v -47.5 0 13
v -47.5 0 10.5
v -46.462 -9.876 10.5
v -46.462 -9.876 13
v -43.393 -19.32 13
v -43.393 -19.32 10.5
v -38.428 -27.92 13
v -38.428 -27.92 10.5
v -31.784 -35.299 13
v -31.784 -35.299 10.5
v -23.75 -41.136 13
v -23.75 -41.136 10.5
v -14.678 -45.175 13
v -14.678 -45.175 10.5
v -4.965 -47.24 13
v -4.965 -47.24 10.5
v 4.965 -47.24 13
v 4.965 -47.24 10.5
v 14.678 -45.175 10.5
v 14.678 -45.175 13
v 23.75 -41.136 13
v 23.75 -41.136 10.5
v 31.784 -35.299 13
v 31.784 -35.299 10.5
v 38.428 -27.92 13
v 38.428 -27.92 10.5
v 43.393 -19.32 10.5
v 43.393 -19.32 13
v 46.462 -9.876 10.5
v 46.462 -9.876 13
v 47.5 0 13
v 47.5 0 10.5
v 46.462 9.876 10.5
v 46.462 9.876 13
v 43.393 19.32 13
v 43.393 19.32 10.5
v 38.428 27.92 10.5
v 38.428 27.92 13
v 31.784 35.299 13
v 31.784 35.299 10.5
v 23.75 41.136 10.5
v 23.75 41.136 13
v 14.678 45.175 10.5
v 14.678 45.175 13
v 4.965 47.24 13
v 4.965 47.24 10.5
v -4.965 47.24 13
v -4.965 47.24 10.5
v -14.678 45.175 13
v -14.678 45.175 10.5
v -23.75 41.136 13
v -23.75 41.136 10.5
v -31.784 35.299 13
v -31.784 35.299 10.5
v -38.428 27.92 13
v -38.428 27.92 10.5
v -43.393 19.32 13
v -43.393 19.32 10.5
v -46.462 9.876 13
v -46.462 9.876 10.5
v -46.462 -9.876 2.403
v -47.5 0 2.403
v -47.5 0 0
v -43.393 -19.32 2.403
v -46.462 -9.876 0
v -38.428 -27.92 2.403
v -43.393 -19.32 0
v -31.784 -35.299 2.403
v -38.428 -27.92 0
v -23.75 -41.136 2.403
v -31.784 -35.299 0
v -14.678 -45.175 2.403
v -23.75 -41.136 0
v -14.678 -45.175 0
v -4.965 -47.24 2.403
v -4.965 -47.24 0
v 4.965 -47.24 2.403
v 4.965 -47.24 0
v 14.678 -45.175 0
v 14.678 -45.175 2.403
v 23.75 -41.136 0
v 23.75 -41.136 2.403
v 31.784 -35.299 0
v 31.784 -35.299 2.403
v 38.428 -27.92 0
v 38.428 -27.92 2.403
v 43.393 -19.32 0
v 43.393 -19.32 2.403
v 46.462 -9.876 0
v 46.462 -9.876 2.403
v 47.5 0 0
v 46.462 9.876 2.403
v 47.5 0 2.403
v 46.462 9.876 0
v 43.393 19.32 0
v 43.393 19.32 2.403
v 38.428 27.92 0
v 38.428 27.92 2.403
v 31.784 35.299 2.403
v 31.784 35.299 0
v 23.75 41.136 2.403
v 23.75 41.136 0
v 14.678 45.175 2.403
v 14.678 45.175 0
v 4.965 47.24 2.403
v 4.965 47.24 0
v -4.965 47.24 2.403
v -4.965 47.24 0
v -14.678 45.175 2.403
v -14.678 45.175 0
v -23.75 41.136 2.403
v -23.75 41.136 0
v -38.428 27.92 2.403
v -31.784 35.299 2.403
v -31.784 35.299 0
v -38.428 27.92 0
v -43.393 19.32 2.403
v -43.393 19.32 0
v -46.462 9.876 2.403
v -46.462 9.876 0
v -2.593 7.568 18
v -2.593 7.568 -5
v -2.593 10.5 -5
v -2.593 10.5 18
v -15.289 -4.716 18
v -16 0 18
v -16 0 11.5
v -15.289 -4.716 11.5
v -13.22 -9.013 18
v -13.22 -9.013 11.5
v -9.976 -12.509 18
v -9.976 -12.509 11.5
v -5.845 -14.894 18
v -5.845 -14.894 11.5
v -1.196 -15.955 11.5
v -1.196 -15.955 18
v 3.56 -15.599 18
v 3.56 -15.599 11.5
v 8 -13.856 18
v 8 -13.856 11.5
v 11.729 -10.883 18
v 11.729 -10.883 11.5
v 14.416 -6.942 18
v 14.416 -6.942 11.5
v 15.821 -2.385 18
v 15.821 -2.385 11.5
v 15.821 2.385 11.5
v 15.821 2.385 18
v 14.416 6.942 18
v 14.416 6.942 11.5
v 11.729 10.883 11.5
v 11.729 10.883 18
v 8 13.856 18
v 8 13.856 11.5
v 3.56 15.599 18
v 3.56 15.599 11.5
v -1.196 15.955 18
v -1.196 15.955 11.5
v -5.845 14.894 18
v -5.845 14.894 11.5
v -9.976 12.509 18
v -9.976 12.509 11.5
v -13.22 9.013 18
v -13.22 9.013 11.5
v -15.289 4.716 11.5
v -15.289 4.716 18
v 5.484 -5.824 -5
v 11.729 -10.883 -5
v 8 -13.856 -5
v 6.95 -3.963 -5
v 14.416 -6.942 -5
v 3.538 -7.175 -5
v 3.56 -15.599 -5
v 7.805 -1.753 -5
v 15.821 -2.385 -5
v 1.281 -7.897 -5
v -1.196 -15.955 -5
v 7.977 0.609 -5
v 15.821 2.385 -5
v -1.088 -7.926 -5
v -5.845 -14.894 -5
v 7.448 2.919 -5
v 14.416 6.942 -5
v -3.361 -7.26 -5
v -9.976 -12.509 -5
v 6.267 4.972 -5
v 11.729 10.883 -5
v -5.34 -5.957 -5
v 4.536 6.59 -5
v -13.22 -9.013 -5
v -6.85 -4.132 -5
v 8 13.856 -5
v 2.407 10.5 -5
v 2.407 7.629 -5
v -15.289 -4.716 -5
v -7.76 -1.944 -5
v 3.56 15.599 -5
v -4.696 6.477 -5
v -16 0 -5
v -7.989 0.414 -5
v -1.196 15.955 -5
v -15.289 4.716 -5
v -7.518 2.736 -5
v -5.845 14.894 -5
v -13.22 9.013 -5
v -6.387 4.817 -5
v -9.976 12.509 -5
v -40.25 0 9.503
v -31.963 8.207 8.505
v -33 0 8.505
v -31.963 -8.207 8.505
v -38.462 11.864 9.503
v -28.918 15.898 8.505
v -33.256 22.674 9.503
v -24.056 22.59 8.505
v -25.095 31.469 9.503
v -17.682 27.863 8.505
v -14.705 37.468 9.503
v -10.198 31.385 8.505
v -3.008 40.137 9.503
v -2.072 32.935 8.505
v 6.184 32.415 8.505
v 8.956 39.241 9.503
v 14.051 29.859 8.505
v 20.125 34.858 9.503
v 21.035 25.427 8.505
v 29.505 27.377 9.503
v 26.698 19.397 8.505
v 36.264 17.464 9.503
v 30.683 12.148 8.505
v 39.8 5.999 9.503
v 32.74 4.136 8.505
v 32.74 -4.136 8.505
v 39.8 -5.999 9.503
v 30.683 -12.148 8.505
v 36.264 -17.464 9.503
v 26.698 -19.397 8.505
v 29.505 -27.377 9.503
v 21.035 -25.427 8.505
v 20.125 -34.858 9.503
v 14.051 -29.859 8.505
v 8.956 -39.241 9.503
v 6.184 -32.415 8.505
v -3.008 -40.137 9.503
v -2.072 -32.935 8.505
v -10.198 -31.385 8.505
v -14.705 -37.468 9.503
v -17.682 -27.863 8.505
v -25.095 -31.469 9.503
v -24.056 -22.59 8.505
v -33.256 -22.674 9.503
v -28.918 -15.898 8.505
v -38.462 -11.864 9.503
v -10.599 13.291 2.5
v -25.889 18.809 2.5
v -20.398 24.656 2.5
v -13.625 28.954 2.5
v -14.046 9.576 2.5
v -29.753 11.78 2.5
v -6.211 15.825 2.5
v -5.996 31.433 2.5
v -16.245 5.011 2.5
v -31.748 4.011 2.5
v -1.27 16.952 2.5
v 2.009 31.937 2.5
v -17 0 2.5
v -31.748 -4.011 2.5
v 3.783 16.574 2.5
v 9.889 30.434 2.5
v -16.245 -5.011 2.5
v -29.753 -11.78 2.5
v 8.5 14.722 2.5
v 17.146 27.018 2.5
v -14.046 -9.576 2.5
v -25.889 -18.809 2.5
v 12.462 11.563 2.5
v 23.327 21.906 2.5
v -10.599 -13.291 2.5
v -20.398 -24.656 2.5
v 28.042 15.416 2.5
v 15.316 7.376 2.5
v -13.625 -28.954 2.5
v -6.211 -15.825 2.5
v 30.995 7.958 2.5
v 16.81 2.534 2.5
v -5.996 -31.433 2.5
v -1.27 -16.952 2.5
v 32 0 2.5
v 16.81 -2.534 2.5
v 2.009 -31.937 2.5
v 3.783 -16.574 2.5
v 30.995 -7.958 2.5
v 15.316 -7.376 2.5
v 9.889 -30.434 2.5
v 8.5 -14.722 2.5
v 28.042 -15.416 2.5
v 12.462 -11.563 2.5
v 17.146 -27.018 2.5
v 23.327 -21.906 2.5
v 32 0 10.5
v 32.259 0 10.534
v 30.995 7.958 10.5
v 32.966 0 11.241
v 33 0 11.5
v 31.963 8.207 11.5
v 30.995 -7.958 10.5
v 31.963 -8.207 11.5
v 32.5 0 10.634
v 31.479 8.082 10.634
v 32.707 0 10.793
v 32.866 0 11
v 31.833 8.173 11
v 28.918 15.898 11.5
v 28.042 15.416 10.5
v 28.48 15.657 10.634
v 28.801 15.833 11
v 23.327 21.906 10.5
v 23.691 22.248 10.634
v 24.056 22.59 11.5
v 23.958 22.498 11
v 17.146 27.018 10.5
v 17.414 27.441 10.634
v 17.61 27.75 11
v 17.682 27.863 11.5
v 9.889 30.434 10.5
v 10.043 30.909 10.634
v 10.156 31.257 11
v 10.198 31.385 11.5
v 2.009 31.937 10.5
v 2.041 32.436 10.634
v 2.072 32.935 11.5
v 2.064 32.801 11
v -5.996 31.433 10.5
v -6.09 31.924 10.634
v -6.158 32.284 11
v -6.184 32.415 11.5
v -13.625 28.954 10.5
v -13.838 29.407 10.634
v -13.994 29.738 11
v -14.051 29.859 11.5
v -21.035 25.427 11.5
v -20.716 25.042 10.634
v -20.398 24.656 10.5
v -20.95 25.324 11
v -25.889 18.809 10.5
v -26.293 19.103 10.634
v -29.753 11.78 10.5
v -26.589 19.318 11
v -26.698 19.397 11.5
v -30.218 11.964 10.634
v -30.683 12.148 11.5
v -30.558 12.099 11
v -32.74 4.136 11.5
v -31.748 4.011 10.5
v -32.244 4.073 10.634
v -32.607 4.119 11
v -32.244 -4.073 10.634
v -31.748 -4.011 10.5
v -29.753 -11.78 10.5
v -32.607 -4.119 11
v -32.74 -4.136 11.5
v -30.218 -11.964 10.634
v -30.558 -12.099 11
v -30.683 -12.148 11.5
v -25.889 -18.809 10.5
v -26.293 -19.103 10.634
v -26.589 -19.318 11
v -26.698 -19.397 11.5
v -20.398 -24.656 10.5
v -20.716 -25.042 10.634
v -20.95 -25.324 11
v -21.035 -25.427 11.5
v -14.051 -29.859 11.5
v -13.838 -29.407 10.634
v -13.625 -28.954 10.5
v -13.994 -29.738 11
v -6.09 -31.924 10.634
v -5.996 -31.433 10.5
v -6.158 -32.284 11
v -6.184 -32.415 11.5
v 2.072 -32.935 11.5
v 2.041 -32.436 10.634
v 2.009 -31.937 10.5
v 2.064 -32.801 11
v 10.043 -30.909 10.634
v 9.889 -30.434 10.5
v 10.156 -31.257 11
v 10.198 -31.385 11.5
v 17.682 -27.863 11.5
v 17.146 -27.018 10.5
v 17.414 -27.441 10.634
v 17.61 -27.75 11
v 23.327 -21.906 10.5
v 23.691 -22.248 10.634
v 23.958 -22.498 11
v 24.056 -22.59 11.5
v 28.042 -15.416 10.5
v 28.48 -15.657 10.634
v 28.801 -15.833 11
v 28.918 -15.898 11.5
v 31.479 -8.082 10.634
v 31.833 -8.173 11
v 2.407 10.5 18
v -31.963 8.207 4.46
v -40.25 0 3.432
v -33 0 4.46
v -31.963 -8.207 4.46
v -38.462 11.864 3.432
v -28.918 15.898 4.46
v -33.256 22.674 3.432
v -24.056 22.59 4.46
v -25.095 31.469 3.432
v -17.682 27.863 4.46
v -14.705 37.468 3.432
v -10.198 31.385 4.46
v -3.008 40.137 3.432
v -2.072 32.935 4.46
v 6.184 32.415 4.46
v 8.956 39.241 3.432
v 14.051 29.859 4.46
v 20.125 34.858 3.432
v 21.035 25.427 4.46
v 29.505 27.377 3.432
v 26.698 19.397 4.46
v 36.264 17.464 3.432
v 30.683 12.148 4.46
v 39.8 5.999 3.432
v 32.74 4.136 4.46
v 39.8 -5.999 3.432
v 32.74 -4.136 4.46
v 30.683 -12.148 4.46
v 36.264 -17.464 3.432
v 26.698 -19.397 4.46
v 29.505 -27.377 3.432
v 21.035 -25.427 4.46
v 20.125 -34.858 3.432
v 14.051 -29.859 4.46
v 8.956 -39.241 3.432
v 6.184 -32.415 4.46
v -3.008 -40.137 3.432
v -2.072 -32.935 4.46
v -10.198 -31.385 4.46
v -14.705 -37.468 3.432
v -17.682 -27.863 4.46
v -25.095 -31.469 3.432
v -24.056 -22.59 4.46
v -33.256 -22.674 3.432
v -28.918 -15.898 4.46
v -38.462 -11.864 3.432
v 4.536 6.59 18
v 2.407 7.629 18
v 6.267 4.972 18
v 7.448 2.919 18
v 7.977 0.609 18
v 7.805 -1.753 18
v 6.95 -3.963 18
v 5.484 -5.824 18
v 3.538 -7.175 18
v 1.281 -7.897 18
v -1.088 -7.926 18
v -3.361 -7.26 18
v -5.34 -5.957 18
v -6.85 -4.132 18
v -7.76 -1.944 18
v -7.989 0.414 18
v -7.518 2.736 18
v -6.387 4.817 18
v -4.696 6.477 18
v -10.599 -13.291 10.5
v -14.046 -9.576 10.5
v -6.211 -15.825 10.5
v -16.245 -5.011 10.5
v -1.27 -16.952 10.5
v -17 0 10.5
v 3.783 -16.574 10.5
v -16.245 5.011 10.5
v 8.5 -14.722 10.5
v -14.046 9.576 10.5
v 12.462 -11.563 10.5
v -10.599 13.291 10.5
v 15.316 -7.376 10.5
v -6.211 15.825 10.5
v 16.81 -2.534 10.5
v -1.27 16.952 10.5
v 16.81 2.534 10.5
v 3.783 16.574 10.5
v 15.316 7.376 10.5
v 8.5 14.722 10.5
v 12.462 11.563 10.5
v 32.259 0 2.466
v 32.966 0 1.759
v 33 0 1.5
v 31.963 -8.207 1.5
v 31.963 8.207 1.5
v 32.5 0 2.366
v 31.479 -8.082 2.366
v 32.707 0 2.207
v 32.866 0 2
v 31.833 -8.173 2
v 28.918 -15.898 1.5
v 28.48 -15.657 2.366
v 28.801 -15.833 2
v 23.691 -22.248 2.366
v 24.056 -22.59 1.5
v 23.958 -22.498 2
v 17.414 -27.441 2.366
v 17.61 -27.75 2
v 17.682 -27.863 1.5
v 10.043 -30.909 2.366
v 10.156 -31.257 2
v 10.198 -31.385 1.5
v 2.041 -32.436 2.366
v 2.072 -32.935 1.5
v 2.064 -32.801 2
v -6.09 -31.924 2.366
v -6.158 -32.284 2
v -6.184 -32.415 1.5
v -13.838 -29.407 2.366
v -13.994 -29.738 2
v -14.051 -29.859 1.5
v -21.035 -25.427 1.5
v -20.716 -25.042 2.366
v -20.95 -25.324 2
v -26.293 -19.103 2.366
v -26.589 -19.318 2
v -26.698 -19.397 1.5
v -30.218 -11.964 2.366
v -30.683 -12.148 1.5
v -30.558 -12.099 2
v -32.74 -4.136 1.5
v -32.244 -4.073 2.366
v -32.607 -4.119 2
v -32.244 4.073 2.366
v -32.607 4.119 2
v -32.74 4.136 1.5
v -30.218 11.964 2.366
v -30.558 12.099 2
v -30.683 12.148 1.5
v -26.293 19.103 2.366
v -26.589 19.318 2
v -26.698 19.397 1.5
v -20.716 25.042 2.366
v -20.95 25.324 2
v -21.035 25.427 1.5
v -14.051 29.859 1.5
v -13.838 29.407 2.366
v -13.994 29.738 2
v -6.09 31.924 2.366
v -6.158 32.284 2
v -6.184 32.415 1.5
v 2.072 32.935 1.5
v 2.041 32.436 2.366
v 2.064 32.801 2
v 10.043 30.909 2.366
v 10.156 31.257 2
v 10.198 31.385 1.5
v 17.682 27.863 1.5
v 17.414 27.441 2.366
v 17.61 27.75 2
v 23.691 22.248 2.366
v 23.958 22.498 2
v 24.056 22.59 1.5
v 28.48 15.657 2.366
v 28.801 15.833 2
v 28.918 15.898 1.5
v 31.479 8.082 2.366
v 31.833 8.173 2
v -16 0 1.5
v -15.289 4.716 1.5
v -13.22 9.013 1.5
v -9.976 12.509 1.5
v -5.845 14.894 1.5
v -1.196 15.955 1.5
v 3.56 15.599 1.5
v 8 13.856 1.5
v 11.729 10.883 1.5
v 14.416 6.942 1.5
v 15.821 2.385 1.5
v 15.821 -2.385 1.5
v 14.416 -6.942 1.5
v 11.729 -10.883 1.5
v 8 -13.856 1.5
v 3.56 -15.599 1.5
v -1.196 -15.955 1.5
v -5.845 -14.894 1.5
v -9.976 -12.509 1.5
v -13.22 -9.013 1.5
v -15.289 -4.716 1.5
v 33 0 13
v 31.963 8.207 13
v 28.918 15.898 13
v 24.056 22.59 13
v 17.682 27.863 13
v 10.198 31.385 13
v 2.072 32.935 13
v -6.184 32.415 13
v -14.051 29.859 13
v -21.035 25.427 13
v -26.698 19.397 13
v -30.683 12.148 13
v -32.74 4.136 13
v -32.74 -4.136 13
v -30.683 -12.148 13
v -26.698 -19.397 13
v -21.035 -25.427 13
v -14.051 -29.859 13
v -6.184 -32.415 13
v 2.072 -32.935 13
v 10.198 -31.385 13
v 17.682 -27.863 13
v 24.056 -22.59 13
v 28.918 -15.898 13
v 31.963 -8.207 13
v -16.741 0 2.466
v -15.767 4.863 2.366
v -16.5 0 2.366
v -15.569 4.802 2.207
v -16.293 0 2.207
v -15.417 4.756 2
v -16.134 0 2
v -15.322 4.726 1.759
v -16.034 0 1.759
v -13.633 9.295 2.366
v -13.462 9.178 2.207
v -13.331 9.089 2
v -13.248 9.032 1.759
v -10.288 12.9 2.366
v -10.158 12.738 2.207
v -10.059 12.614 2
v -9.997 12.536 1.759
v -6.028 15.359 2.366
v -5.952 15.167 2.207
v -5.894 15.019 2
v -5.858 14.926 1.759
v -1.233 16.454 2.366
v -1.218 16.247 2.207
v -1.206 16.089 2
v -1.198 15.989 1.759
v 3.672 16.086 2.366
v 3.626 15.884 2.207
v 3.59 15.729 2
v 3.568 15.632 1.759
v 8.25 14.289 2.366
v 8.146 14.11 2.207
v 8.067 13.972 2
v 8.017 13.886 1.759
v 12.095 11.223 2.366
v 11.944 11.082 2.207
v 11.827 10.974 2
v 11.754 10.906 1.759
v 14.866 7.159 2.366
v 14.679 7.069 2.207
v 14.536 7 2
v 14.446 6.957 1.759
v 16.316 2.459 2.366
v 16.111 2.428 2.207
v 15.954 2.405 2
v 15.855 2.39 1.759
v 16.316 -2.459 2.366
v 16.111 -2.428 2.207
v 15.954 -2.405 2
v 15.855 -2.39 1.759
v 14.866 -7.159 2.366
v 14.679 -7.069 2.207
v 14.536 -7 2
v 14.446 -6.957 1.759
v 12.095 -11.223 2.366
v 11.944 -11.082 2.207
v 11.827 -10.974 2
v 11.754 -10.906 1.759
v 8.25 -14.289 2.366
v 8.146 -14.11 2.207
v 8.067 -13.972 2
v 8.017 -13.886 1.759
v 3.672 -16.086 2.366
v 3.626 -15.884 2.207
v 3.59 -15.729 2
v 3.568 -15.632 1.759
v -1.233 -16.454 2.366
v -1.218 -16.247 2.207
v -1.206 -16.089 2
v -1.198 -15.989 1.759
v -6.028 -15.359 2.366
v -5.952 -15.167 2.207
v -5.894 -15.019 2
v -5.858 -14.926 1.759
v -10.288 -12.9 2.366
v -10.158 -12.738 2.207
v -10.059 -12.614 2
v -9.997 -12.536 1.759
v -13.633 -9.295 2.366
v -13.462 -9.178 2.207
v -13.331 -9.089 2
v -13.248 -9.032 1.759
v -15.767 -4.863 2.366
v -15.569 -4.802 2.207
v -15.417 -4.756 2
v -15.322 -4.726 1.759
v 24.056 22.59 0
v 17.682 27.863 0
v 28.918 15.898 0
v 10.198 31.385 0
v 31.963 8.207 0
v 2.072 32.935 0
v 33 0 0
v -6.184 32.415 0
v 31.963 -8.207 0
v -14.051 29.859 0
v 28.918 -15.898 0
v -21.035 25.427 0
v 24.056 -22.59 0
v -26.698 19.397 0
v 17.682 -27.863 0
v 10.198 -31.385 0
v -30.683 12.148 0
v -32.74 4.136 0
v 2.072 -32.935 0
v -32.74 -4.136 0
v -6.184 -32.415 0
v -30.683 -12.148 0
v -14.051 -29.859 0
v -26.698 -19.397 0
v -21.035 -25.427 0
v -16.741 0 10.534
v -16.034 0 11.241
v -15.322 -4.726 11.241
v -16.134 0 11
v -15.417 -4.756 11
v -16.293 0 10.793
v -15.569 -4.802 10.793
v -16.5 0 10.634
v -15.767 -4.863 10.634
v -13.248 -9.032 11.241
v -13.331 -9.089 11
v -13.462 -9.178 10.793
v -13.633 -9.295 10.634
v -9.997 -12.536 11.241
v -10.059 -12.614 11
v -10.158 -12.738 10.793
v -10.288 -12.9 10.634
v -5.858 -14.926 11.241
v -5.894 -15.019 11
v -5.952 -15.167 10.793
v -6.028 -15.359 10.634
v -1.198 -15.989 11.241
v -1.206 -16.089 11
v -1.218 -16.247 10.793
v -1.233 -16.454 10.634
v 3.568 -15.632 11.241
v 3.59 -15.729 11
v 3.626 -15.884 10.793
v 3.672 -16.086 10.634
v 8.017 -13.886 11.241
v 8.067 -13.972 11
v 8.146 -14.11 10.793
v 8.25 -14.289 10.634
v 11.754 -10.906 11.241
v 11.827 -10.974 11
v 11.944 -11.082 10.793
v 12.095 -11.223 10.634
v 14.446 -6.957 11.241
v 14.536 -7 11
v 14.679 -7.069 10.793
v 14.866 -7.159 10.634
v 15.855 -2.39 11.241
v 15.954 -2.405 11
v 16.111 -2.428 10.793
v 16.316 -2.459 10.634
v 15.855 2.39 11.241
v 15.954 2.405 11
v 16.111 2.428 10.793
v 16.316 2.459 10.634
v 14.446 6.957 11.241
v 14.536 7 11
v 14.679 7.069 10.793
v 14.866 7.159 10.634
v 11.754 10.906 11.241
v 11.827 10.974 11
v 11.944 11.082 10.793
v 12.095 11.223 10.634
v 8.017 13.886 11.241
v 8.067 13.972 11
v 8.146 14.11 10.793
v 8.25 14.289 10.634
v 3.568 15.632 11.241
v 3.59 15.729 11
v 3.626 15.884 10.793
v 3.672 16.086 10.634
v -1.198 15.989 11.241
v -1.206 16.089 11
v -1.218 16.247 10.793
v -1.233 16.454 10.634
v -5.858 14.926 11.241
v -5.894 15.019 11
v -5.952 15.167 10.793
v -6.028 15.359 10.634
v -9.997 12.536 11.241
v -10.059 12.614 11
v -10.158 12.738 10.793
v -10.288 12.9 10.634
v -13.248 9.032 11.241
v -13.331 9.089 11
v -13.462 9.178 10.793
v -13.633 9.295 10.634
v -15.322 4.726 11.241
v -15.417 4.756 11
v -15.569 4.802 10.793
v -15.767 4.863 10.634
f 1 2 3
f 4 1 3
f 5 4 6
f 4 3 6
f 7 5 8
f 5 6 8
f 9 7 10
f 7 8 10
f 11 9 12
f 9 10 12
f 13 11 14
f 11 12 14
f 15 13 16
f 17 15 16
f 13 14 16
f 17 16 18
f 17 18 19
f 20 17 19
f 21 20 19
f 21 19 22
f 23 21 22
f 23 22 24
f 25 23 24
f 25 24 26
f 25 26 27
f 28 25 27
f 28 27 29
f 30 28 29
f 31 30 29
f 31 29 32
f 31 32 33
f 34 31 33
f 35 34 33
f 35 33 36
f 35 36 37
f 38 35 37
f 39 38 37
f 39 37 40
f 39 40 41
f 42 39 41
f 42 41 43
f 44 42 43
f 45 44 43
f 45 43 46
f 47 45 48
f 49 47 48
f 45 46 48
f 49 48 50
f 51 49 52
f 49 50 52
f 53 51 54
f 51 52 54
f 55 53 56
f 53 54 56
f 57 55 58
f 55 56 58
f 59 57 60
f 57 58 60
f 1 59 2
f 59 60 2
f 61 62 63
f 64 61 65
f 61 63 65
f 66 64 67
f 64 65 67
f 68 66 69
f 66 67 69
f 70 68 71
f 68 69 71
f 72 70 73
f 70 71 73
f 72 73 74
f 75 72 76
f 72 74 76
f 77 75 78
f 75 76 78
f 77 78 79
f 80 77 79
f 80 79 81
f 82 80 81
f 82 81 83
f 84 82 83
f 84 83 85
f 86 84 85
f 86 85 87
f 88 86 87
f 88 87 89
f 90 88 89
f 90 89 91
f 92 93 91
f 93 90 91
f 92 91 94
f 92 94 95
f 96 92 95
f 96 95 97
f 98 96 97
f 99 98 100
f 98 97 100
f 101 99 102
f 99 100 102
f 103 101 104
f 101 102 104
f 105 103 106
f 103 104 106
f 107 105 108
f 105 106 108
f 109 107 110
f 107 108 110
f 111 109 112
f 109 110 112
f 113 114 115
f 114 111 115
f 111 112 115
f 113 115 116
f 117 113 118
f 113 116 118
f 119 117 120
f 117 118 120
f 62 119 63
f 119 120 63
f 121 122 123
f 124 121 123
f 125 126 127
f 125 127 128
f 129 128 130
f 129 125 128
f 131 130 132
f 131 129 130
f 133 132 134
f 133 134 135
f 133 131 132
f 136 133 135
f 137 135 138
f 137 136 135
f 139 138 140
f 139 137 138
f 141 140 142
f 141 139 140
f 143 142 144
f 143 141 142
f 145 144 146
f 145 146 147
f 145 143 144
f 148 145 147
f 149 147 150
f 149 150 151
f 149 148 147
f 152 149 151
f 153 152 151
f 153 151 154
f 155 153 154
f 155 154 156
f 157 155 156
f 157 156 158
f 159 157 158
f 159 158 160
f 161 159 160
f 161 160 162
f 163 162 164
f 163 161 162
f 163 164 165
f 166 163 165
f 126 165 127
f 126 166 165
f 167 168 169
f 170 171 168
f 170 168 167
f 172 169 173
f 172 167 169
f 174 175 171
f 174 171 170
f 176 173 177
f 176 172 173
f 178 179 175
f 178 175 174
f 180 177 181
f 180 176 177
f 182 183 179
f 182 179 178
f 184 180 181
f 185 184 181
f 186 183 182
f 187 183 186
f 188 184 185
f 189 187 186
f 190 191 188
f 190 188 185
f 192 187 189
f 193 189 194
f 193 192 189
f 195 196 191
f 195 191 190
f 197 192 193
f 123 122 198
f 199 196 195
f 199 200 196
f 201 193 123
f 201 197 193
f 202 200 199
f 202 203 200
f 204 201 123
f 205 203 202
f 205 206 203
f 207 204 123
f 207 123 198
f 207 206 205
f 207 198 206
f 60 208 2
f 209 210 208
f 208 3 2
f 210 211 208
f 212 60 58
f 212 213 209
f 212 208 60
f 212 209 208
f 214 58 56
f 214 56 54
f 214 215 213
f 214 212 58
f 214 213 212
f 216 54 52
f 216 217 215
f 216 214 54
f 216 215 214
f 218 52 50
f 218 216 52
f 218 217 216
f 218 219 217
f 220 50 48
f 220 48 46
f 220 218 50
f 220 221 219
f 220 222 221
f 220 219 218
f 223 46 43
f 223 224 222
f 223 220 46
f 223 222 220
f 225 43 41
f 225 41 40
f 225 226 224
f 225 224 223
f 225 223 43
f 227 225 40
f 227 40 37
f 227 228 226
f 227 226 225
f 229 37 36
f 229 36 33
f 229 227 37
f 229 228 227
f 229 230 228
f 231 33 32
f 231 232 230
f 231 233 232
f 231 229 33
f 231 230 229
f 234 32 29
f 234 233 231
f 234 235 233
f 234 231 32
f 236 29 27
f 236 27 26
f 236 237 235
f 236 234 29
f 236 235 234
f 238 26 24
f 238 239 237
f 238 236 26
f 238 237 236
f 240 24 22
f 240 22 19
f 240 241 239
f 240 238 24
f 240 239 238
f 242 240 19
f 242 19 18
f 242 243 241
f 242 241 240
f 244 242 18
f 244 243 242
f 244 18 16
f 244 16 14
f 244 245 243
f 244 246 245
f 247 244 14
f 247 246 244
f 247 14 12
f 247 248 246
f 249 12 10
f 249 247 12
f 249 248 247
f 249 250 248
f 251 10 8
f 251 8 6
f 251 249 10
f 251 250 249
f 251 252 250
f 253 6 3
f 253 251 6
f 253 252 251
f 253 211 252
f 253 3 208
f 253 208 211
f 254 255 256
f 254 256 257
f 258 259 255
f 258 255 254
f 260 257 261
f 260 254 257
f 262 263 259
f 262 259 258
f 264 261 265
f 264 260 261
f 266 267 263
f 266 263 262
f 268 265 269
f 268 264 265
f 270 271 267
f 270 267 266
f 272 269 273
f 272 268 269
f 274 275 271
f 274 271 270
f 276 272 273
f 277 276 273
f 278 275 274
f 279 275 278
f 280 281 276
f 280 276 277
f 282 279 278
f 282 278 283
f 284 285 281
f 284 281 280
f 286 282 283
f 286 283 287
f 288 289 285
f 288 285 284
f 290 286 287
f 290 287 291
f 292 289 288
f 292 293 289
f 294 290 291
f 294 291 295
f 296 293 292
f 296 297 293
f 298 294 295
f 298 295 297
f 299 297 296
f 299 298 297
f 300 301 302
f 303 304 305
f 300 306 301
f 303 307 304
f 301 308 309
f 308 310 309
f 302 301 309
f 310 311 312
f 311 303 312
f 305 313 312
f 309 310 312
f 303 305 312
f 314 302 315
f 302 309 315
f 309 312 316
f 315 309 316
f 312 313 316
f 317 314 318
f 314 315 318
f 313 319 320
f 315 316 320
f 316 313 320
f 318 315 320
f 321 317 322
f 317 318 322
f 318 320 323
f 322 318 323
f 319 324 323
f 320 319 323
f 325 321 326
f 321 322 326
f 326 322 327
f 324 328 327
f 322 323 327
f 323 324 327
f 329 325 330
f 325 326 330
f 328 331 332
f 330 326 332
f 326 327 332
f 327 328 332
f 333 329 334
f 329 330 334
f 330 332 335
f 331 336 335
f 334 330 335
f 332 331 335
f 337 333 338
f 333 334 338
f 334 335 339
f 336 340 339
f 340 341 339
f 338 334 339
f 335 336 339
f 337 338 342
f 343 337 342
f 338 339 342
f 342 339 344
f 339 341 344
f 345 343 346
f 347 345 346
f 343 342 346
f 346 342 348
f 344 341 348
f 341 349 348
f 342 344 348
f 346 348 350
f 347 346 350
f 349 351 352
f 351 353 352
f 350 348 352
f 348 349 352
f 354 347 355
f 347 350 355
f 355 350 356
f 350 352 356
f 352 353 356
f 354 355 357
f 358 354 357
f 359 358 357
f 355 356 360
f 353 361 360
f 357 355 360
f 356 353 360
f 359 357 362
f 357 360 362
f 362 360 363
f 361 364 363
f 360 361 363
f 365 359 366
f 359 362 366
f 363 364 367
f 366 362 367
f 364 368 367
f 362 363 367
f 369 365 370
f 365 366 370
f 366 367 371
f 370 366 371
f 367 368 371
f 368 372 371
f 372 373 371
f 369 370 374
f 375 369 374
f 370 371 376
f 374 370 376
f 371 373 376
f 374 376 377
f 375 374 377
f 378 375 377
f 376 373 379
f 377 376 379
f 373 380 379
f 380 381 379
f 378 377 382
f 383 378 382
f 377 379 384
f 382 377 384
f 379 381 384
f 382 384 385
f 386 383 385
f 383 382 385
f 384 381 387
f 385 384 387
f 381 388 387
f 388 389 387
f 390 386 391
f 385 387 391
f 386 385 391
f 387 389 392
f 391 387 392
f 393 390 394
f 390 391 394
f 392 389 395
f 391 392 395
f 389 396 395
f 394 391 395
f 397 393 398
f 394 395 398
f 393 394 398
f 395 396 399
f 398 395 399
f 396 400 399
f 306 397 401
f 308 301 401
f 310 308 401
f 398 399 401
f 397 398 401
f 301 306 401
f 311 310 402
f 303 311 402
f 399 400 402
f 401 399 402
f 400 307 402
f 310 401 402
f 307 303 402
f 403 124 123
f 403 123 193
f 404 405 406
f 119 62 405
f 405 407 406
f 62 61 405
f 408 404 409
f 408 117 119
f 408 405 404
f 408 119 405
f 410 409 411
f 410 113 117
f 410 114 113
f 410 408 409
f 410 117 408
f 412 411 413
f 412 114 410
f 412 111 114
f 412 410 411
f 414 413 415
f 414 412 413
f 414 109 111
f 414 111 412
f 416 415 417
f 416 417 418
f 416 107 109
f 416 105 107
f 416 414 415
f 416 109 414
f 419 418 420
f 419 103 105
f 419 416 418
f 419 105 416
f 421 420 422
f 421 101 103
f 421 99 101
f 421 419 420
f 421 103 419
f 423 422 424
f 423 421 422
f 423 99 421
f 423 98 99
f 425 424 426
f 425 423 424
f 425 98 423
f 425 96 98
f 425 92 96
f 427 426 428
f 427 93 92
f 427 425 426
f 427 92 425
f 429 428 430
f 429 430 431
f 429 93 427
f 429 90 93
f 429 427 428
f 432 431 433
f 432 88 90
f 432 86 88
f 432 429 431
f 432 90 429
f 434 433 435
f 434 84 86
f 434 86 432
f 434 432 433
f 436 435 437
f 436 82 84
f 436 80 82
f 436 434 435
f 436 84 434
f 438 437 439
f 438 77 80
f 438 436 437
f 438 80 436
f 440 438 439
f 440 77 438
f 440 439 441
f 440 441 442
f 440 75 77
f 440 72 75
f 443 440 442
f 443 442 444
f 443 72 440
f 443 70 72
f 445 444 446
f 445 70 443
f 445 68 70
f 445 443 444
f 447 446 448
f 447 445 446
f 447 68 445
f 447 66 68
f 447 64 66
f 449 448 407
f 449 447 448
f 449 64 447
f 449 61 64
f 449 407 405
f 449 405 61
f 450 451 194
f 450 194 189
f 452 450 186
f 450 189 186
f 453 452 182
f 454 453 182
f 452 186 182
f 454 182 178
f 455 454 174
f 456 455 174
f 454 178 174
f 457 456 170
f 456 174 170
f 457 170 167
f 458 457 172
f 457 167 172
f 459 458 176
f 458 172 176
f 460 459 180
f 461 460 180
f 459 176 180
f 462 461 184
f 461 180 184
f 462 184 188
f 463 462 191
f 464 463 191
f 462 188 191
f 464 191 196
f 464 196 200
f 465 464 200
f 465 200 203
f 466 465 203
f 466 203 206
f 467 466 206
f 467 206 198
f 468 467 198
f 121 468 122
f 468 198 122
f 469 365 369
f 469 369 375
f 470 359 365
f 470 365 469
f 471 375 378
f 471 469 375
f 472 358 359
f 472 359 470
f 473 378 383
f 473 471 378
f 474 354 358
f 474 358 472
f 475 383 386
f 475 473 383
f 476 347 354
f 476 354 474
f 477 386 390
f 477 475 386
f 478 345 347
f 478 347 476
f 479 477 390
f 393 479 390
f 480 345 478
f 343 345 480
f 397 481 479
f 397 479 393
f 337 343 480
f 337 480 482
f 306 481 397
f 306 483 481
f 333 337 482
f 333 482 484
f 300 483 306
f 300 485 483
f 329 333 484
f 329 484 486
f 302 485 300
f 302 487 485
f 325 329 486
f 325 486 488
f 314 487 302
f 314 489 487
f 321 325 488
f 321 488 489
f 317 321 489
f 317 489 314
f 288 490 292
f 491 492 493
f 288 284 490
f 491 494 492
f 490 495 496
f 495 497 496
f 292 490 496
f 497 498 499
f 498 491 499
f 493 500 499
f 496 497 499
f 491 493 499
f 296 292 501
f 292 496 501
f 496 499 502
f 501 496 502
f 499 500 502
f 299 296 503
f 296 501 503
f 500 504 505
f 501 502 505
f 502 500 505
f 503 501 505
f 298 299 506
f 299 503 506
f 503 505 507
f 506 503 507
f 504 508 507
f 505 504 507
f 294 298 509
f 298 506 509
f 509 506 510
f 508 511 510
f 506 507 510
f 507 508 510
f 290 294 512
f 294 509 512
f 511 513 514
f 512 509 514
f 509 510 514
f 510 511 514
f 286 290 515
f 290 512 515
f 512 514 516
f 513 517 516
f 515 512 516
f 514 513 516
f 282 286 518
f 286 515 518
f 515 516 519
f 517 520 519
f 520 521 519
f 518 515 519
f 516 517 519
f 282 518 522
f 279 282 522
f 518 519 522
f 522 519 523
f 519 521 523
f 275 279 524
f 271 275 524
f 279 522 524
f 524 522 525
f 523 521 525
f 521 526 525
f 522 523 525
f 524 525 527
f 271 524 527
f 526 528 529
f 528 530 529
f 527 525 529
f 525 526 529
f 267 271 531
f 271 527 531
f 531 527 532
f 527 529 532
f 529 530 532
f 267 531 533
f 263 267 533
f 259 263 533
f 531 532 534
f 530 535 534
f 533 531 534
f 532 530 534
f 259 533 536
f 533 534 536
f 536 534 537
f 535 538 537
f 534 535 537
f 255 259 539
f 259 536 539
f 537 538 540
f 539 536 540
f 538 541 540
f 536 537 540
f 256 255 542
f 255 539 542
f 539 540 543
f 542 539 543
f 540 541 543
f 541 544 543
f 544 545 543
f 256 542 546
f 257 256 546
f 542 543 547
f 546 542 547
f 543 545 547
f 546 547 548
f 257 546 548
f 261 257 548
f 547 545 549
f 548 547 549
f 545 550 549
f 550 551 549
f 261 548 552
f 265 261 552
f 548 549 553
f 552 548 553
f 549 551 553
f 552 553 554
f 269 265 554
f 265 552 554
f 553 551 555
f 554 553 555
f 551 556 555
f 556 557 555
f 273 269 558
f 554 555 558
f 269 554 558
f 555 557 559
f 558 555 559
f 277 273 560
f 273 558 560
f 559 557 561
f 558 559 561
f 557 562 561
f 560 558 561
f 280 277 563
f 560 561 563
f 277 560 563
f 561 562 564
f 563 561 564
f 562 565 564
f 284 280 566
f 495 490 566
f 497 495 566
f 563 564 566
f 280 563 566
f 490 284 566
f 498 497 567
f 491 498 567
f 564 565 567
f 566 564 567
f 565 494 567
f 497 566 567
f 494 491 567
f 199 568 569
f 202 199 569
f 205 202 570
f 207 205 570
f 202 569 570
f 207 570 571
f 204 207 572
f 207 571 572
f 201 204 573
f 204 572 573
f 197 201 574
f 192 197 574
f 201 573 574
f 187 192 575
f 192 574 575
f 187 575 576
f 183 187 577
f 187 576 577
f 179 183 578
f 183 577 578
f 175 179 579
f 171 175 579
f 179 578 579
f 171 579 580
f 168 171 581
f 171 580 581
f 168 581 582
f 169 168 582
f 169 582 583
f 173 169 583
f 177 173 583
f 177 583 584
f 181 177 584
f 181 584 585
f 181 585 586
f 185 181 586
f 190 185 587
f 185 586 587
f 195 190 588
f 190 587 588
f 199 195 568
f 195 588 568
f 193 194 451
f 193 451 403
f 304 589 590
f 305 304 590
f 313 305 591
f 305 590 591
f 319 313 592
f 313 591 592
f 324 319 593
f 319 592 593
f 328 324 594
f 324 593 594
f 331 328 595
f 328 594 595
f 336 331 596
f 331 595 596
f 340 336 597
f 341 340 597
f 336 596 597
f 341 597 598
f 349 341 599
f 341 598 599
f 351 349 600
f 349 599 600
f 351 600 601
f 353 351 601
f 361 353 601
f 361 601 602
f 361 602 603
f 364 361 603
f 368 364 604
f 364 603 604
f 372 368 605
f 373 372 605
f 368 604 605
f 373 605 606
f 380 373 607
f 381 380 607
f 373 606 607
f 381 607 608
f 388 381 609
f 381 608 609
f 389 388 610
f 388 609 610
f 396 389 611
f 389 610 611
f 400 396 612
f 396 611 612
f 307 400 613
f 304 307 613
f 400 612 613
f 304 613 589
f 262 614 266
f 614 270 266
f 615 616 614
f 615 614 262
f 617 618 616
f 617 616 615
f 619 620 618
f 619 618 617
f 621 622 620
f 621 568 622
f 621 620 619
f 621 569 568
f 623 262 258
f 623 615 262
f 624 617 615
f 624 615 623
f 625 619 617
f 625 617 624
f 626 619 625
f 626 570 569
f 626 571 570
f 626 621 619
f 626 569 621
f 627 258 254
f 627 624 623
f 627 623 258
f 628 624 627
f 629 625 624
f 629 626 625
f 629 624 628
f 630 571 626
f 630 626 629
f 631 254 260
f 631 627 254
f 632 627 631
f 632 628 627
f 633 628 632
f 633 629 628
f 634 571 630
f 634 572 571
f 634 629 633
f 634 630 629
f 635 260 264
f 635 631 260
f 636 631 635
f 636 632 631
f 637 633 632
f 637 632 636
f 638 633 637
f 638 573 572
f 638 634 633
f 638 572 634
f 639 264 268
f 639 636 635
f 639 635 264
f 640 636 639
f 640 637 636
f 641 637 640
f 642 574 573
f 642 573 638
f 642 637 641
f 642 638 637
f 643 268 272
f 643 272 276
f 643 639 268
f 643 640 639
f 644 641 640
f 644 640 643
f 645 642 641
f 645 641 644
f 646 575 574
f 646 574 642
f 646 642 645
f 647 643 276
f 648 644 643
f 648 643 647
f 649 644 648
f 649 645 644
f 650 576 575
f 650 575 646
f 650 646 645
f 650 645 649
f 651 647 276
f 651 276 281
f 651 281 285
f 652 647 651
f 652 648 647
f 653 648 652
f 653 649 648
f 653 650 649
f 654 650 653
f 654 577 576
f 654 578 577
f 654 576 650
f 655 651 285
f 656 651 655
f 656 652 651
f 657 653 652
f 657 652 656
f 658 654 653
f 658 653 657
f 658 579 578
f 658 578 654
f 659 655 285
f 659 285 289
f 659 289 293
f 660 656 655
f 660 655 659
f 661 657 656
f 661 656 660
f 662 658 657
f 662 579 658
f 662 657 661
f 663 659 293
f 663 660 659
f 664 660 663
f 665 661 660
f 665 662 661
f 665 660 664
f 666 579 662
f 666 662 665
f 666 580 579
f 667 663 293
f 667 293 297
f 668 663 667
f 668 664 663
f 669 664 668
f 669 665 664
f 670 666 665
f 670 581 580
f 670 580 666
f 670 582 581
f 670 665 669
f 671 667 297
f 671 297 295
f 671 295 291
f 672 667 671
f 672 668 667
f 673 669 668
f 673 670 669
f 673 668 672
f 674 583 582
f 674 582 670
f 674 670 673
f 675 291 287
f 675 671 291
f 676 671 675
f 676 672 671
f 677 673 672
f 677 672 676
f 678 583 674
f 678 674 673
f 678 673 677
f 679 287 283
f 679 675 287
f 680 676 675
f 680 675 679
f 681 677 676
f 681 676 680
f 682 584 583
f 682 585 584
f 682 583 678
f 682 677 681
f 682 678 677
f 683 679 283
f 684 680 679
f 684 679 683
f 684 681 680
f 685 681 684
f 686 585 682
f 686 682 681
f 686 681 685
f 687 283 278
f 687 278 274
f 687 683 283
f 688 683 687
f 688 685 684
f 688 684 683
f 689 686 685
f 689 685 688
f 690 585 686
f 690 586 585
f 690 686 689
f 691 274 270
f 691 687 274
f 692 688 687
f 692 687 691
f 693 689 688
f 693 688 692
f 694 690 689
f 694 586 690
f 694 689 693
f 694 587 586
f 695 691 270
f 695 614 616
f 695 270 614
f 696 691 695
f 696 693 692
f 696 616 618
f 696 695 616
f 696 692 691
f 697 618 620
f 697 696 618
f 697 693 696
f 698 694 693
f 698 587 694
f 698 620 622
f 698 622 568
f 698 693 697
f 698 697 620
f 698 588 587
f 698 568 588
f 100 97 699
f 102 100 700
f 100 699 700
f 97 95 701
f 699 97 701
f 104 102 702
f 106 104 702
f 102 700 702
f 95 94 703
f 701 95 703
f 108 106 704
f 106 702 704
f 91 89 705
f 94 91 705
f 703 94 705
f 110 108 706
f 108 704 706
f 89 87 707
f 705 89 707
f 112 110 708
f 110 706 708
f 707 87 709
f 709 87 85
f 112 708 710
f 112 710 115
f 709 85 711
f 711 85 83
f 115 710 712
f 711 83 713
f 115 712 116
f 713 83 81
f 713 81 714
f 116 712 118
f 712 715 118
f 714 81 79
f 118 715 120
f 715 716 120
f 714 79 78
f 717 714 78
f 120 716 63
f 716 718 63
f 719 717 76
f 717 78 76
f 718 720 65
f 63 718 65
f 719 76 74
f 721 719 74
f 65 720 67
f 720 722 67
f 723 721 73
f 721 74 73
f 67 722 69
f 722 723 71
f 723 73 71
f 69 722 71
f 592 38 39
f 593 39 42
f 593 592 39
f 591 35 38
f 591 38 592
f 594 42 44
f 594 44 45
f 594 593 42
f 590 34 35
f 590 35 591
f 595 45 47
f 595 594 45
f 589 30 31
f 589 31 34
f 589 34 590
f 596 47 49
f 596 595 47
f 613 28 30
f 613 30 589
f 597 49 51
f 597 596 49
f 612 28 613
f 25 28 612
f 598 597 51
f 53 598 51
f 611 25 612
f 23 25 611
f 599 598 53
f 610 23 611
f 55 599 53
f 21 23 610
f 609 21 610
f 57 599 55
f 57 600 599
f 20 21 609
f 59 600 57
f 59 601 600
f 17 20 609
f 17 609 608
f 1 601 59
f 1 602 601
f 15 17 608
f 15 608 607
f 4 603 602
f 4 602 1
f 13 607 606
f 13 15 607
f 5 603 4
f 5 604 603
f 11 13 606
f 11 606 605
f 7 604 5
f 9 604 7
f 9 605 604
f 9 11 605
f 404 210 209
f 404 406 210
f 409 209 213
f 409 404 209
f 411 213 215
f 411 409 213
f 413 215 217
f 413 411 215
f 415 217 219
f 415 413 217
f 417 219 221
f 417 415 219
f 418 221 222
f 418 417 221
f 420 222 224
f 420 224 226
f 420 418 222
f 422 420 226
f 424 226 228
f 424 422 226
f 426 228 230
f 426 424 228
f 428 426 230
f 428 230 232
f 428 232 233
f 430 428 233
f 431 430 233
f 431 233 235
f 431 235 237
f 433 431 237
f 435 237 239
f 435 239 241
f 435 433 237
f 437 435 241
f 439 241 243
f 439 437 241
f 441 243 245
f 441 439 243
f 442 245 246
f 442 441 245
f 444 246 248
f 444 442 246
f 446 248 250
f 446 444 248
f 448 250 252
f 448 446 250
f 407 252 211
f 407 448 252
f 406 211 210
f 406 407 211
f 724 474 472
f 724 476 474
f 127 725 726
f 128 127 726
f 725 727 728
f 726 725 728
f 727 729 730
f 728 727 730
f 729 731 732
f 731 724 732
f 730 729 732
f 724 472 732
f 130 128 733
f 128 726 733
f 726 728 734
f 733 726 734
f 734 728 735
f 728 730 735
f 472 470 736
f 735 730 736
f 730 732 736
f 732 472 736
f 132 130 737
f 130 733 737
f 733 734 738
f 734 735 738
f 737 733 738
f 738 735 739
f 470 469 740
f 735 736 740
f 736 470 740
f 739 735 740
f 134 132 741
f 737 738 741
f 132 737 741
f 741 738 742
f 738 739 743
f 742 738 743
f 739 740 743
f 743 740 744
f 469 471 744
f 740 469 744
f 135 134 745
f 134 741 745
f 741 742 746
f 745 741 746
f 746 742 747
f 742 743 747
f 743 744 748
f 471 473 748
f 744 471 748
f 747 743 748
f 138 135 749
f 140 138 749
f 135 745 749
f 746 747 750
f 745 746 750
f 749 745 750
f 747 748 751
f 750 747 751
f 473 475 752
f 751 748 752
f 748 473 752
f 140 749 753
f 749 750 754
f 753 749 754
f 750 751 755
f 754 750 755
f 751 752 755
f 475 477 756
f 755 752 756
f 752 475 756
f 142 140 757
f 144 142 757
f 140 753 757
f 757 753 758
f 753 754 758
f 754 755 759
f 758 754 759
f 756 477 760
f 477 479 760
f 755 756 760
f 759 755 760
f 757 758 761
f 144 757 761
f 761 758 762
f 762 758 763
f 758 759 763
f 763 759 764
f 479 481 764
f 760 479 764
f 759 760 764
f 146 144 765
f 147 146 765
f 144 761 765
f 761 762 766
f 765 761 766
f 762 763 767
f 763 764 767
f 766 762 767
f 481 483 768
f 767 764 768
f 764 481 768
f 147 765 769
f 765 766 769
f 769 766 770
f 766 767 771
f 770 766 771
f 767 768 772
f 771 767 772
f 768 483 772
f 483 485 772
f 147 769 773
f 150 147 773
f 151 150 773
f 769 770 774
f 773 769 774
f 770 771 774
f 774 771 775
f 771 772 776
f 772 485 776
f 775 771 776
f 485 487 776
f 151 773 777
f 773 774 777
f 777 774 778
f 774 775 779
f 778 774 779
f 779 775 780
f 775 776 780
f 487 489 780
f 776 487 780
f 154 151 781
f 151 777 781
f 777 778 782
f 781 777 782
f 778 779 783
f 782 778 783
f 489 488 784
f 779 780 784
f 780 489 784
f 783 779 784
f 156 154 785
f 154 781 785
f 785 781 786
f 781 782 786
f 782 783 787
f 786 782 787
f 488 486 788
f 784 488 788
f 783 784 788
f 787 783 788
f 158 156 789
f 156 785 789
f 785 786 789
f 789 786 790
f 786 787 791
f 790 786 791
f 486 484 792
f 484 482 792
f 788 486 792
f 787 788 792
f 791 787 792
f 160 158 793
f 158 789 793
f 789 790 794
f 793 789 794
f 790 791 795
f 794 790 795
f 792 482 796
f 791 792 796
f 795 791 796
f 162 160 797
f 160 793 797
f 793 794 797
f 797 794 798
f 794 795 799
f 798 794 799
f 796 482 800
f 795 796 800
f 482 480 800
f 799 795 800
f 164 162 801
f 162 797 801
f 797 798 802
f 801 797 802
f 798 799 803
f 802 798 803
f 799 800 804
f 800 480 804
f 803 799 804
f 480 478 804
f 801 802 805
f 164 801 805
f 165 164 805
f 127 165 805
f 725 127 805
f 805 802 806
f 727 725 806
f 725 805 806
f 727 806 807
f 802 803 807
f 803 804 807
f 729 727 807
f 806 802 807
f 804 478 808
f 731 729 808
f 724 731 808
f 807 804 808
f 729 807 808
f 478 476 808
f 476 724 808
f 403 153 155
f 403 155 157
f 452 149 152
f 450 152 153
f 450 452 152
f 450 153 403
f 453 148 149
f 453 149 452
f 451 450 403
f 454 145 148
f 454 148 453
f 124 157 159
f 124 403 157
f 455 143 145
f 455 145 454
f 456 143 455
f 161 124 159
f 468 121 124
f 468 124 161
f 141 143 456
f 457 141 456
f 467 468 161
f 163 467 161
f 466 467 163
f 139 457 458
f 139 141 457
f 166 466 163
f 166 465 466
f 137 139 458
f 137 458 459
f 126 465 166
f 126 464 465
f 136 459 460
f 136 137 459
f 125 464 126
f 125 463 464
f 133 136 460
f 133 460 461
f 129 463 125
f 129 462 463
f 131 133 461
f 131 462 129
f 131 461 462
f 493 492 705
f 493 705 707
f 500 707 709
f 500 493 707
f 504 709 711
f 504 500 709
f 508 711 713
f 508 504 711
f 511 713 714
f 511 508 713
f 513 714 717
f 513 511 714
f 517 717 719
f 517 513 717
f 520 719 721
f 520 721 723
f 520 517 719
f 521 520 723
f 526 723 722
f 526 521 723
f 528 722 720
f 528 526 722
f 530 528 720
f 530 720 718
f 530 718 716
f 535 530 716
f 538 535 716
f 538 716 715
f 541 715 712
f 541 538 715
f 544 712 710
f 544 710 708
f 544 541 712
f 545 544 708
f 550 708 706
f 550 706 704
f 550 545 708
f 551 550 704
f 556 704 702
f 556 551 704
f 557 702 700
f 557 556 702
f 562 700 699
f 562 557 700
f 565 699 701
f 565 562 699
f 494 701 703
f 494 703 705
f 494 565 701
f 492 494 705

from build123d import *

# Parameters (mm, degrees)
SKETCH1_R               = 47.5
BOSS_EXTRUDE1_DEPTH     = 13
SKETCH2_R               = 33
CUT_EXTRUDE1_DEPTH      = 2.5
CUT_EXTRUDE2_START      = -2.5
SKETCH3_R               = 33
CUT_EXTRUDE2_DEPTH      = 2.5
SKETCH4_R               = 16
BOSS_EXTRUDE2_DEPTH     = 7.5
BOSS_EXTRUDE3_START     = 7.5
SKETCH5_R               = 16
BOSS_EXTRUDE3_DEPTH     = 7.5
SKETCH9_R               = 8
CUT_EXTRUDE3_DEPTH      = 72.003521039
FILLET1_R               = 1
FILLET2_R               = 1
CUT_EXTRUDE5_DEPTH      = 27
CUT_EXTRUDE5_DEPTH_BACK = 17
SKETCH13_W              = 5
SKETCH13_H              = 4.917634469
FILLET3_R               = 1
FILLET4_R               = 1


with BuildPart() as part:
    # Sketch1 → Boss-Extrude1 (new body)
    with BuildSketch(Plane.XY):
        with Locations(Location((0, 0, 0), (0, 0, 180))):
            Circle(SKETCH1_R)
    extrude(amount=BOSS_EXTRUDE1_DEPTH)

    # Sketch2 → Cut-Extrude1 (cut)
    with BuildSketch(Plane.XY.offset(13)):
        Circle(SKETCH2_R)
    extrude(amount=-CUT_EXTRUDE1_DEPTH, mode=Mode.SUBTRACT)

    # Sketch3 → Cut-Extrude2 (cut)
    with BuildSketch(Plane(origin=(0, 0, 0), x_dir=(-1, 0, 0), z_dir=(0, 0, -1)).offset(CUT_EXTRUDE2_START)):
        with Locations(Location((0, 0, 0), (0, 0, 180))):
            Circle(SKETCH3_R)
    extrude(amount=CUT_EXTRUDE2_DEPTH, mode=Mode.SUBTRACT)

    # Sketch4 → Boss-Extrude2 (add)
    with BuildSketch(Plane(origin=(0, 0, 2.5), x_dir=(-1, 0, 0), z_dir=(0, 0, -1))):
        Circle(SKETCH4_R)
    extrude(amount=BOSS_EXTRUDE2_DEPTH)

    # Sketch5 → Boss-Extrude3 (add)
    with BuildSketch(Plane.XY.offset(10.5).offset(BOSS_EXTRUDE3_START)):
        with Locations(Location((0, 0, 0), (0, 0, 180))):
            Circle(SKETCH5_R)
    extrude(amount=-BOSS_EXTRUDE3_DEPTH)

    # Sketch9 → Cut-Extrude3 (cut, through all)
    with BuildSketch(Plane(origin=(0, 0, -5), x_dir=(-1, 0, 0), z_dir=(0, 0, -1))):
        Circle(SKETCH9_R)
    extrude(amount=-CUT_EXTRUDE3_DEPTH, mode=Mode.SUBTRACT)

    # Fillet1
    fillet1_edges = [part.edges().sort_by_distance(p)[0] for p in [
        (16, 0, 2.5),
    ]]
    fillet(fillet1_edges, radius=FILLET1_R)

    # Fillet2
    fillet2_edges = [part.edges().sort_by_distance(p)[0] for p in [
        (16, 0, 10.5),
    ]]
    fillet(fillet2_edges, radius=FILLET2_R)

    # Sketch12 → Cut-Revolve1 (revolve, cut)
    with BuildSketch(Plane(origin=(0, 0, 0), x_dir=(0, 0, -1), z_dir=(1, 0, 0)), mode=Mode.PRIVATE) as cut_revolve1_sk:
        Polygon((-10.5, 47.5), (-8.505134927, 33), (-4.459991863, 33), (-2.40344568, 47.5), align=None)
    revolve(cut_revolve1_sk.sketch.rotate(Axis((0, 0, 31.244121173), (0, 0, -1)), 270), axis=Axis((0, 0, 31.244121173), (0, 0, -1)), mode=Mode.SUBTRACT)

    # Sketch13 → Cut-Extrude5 (cut, two sides: drawn at the far end of the back side and taken through both)
    with BuildSketch(Plane.XY.offset(-CUT_EXTRUDE5_DEPTH_BACK)):
        with Locations((-0.093134084, 8.041182766)):
            Rectangle(SKETCH13_W, SKETCH13_H)
    extrude(amount=CUT_EXTRUDE5_DEPTH + CUT_EXTRUDE5_DEPTH_BACK, mode=Mode.SUBTRACT)

    # Fillet3
    fillet3_edges = [part.edges().sort_by_distance(p)[0] for p in [
        (-33, 0, 2.5),
    ]]
    fillet(fillet3_edges, radius=FILLET3_R)

    # Fillet4
    fillet4_edges = [part.edges().sort_by_distance(p)[0] for p in [
        (-33, 0, 10.5),
    ]]
    fillet(fillet4_edges, radius=FILLET4_R)


solid = part.part
